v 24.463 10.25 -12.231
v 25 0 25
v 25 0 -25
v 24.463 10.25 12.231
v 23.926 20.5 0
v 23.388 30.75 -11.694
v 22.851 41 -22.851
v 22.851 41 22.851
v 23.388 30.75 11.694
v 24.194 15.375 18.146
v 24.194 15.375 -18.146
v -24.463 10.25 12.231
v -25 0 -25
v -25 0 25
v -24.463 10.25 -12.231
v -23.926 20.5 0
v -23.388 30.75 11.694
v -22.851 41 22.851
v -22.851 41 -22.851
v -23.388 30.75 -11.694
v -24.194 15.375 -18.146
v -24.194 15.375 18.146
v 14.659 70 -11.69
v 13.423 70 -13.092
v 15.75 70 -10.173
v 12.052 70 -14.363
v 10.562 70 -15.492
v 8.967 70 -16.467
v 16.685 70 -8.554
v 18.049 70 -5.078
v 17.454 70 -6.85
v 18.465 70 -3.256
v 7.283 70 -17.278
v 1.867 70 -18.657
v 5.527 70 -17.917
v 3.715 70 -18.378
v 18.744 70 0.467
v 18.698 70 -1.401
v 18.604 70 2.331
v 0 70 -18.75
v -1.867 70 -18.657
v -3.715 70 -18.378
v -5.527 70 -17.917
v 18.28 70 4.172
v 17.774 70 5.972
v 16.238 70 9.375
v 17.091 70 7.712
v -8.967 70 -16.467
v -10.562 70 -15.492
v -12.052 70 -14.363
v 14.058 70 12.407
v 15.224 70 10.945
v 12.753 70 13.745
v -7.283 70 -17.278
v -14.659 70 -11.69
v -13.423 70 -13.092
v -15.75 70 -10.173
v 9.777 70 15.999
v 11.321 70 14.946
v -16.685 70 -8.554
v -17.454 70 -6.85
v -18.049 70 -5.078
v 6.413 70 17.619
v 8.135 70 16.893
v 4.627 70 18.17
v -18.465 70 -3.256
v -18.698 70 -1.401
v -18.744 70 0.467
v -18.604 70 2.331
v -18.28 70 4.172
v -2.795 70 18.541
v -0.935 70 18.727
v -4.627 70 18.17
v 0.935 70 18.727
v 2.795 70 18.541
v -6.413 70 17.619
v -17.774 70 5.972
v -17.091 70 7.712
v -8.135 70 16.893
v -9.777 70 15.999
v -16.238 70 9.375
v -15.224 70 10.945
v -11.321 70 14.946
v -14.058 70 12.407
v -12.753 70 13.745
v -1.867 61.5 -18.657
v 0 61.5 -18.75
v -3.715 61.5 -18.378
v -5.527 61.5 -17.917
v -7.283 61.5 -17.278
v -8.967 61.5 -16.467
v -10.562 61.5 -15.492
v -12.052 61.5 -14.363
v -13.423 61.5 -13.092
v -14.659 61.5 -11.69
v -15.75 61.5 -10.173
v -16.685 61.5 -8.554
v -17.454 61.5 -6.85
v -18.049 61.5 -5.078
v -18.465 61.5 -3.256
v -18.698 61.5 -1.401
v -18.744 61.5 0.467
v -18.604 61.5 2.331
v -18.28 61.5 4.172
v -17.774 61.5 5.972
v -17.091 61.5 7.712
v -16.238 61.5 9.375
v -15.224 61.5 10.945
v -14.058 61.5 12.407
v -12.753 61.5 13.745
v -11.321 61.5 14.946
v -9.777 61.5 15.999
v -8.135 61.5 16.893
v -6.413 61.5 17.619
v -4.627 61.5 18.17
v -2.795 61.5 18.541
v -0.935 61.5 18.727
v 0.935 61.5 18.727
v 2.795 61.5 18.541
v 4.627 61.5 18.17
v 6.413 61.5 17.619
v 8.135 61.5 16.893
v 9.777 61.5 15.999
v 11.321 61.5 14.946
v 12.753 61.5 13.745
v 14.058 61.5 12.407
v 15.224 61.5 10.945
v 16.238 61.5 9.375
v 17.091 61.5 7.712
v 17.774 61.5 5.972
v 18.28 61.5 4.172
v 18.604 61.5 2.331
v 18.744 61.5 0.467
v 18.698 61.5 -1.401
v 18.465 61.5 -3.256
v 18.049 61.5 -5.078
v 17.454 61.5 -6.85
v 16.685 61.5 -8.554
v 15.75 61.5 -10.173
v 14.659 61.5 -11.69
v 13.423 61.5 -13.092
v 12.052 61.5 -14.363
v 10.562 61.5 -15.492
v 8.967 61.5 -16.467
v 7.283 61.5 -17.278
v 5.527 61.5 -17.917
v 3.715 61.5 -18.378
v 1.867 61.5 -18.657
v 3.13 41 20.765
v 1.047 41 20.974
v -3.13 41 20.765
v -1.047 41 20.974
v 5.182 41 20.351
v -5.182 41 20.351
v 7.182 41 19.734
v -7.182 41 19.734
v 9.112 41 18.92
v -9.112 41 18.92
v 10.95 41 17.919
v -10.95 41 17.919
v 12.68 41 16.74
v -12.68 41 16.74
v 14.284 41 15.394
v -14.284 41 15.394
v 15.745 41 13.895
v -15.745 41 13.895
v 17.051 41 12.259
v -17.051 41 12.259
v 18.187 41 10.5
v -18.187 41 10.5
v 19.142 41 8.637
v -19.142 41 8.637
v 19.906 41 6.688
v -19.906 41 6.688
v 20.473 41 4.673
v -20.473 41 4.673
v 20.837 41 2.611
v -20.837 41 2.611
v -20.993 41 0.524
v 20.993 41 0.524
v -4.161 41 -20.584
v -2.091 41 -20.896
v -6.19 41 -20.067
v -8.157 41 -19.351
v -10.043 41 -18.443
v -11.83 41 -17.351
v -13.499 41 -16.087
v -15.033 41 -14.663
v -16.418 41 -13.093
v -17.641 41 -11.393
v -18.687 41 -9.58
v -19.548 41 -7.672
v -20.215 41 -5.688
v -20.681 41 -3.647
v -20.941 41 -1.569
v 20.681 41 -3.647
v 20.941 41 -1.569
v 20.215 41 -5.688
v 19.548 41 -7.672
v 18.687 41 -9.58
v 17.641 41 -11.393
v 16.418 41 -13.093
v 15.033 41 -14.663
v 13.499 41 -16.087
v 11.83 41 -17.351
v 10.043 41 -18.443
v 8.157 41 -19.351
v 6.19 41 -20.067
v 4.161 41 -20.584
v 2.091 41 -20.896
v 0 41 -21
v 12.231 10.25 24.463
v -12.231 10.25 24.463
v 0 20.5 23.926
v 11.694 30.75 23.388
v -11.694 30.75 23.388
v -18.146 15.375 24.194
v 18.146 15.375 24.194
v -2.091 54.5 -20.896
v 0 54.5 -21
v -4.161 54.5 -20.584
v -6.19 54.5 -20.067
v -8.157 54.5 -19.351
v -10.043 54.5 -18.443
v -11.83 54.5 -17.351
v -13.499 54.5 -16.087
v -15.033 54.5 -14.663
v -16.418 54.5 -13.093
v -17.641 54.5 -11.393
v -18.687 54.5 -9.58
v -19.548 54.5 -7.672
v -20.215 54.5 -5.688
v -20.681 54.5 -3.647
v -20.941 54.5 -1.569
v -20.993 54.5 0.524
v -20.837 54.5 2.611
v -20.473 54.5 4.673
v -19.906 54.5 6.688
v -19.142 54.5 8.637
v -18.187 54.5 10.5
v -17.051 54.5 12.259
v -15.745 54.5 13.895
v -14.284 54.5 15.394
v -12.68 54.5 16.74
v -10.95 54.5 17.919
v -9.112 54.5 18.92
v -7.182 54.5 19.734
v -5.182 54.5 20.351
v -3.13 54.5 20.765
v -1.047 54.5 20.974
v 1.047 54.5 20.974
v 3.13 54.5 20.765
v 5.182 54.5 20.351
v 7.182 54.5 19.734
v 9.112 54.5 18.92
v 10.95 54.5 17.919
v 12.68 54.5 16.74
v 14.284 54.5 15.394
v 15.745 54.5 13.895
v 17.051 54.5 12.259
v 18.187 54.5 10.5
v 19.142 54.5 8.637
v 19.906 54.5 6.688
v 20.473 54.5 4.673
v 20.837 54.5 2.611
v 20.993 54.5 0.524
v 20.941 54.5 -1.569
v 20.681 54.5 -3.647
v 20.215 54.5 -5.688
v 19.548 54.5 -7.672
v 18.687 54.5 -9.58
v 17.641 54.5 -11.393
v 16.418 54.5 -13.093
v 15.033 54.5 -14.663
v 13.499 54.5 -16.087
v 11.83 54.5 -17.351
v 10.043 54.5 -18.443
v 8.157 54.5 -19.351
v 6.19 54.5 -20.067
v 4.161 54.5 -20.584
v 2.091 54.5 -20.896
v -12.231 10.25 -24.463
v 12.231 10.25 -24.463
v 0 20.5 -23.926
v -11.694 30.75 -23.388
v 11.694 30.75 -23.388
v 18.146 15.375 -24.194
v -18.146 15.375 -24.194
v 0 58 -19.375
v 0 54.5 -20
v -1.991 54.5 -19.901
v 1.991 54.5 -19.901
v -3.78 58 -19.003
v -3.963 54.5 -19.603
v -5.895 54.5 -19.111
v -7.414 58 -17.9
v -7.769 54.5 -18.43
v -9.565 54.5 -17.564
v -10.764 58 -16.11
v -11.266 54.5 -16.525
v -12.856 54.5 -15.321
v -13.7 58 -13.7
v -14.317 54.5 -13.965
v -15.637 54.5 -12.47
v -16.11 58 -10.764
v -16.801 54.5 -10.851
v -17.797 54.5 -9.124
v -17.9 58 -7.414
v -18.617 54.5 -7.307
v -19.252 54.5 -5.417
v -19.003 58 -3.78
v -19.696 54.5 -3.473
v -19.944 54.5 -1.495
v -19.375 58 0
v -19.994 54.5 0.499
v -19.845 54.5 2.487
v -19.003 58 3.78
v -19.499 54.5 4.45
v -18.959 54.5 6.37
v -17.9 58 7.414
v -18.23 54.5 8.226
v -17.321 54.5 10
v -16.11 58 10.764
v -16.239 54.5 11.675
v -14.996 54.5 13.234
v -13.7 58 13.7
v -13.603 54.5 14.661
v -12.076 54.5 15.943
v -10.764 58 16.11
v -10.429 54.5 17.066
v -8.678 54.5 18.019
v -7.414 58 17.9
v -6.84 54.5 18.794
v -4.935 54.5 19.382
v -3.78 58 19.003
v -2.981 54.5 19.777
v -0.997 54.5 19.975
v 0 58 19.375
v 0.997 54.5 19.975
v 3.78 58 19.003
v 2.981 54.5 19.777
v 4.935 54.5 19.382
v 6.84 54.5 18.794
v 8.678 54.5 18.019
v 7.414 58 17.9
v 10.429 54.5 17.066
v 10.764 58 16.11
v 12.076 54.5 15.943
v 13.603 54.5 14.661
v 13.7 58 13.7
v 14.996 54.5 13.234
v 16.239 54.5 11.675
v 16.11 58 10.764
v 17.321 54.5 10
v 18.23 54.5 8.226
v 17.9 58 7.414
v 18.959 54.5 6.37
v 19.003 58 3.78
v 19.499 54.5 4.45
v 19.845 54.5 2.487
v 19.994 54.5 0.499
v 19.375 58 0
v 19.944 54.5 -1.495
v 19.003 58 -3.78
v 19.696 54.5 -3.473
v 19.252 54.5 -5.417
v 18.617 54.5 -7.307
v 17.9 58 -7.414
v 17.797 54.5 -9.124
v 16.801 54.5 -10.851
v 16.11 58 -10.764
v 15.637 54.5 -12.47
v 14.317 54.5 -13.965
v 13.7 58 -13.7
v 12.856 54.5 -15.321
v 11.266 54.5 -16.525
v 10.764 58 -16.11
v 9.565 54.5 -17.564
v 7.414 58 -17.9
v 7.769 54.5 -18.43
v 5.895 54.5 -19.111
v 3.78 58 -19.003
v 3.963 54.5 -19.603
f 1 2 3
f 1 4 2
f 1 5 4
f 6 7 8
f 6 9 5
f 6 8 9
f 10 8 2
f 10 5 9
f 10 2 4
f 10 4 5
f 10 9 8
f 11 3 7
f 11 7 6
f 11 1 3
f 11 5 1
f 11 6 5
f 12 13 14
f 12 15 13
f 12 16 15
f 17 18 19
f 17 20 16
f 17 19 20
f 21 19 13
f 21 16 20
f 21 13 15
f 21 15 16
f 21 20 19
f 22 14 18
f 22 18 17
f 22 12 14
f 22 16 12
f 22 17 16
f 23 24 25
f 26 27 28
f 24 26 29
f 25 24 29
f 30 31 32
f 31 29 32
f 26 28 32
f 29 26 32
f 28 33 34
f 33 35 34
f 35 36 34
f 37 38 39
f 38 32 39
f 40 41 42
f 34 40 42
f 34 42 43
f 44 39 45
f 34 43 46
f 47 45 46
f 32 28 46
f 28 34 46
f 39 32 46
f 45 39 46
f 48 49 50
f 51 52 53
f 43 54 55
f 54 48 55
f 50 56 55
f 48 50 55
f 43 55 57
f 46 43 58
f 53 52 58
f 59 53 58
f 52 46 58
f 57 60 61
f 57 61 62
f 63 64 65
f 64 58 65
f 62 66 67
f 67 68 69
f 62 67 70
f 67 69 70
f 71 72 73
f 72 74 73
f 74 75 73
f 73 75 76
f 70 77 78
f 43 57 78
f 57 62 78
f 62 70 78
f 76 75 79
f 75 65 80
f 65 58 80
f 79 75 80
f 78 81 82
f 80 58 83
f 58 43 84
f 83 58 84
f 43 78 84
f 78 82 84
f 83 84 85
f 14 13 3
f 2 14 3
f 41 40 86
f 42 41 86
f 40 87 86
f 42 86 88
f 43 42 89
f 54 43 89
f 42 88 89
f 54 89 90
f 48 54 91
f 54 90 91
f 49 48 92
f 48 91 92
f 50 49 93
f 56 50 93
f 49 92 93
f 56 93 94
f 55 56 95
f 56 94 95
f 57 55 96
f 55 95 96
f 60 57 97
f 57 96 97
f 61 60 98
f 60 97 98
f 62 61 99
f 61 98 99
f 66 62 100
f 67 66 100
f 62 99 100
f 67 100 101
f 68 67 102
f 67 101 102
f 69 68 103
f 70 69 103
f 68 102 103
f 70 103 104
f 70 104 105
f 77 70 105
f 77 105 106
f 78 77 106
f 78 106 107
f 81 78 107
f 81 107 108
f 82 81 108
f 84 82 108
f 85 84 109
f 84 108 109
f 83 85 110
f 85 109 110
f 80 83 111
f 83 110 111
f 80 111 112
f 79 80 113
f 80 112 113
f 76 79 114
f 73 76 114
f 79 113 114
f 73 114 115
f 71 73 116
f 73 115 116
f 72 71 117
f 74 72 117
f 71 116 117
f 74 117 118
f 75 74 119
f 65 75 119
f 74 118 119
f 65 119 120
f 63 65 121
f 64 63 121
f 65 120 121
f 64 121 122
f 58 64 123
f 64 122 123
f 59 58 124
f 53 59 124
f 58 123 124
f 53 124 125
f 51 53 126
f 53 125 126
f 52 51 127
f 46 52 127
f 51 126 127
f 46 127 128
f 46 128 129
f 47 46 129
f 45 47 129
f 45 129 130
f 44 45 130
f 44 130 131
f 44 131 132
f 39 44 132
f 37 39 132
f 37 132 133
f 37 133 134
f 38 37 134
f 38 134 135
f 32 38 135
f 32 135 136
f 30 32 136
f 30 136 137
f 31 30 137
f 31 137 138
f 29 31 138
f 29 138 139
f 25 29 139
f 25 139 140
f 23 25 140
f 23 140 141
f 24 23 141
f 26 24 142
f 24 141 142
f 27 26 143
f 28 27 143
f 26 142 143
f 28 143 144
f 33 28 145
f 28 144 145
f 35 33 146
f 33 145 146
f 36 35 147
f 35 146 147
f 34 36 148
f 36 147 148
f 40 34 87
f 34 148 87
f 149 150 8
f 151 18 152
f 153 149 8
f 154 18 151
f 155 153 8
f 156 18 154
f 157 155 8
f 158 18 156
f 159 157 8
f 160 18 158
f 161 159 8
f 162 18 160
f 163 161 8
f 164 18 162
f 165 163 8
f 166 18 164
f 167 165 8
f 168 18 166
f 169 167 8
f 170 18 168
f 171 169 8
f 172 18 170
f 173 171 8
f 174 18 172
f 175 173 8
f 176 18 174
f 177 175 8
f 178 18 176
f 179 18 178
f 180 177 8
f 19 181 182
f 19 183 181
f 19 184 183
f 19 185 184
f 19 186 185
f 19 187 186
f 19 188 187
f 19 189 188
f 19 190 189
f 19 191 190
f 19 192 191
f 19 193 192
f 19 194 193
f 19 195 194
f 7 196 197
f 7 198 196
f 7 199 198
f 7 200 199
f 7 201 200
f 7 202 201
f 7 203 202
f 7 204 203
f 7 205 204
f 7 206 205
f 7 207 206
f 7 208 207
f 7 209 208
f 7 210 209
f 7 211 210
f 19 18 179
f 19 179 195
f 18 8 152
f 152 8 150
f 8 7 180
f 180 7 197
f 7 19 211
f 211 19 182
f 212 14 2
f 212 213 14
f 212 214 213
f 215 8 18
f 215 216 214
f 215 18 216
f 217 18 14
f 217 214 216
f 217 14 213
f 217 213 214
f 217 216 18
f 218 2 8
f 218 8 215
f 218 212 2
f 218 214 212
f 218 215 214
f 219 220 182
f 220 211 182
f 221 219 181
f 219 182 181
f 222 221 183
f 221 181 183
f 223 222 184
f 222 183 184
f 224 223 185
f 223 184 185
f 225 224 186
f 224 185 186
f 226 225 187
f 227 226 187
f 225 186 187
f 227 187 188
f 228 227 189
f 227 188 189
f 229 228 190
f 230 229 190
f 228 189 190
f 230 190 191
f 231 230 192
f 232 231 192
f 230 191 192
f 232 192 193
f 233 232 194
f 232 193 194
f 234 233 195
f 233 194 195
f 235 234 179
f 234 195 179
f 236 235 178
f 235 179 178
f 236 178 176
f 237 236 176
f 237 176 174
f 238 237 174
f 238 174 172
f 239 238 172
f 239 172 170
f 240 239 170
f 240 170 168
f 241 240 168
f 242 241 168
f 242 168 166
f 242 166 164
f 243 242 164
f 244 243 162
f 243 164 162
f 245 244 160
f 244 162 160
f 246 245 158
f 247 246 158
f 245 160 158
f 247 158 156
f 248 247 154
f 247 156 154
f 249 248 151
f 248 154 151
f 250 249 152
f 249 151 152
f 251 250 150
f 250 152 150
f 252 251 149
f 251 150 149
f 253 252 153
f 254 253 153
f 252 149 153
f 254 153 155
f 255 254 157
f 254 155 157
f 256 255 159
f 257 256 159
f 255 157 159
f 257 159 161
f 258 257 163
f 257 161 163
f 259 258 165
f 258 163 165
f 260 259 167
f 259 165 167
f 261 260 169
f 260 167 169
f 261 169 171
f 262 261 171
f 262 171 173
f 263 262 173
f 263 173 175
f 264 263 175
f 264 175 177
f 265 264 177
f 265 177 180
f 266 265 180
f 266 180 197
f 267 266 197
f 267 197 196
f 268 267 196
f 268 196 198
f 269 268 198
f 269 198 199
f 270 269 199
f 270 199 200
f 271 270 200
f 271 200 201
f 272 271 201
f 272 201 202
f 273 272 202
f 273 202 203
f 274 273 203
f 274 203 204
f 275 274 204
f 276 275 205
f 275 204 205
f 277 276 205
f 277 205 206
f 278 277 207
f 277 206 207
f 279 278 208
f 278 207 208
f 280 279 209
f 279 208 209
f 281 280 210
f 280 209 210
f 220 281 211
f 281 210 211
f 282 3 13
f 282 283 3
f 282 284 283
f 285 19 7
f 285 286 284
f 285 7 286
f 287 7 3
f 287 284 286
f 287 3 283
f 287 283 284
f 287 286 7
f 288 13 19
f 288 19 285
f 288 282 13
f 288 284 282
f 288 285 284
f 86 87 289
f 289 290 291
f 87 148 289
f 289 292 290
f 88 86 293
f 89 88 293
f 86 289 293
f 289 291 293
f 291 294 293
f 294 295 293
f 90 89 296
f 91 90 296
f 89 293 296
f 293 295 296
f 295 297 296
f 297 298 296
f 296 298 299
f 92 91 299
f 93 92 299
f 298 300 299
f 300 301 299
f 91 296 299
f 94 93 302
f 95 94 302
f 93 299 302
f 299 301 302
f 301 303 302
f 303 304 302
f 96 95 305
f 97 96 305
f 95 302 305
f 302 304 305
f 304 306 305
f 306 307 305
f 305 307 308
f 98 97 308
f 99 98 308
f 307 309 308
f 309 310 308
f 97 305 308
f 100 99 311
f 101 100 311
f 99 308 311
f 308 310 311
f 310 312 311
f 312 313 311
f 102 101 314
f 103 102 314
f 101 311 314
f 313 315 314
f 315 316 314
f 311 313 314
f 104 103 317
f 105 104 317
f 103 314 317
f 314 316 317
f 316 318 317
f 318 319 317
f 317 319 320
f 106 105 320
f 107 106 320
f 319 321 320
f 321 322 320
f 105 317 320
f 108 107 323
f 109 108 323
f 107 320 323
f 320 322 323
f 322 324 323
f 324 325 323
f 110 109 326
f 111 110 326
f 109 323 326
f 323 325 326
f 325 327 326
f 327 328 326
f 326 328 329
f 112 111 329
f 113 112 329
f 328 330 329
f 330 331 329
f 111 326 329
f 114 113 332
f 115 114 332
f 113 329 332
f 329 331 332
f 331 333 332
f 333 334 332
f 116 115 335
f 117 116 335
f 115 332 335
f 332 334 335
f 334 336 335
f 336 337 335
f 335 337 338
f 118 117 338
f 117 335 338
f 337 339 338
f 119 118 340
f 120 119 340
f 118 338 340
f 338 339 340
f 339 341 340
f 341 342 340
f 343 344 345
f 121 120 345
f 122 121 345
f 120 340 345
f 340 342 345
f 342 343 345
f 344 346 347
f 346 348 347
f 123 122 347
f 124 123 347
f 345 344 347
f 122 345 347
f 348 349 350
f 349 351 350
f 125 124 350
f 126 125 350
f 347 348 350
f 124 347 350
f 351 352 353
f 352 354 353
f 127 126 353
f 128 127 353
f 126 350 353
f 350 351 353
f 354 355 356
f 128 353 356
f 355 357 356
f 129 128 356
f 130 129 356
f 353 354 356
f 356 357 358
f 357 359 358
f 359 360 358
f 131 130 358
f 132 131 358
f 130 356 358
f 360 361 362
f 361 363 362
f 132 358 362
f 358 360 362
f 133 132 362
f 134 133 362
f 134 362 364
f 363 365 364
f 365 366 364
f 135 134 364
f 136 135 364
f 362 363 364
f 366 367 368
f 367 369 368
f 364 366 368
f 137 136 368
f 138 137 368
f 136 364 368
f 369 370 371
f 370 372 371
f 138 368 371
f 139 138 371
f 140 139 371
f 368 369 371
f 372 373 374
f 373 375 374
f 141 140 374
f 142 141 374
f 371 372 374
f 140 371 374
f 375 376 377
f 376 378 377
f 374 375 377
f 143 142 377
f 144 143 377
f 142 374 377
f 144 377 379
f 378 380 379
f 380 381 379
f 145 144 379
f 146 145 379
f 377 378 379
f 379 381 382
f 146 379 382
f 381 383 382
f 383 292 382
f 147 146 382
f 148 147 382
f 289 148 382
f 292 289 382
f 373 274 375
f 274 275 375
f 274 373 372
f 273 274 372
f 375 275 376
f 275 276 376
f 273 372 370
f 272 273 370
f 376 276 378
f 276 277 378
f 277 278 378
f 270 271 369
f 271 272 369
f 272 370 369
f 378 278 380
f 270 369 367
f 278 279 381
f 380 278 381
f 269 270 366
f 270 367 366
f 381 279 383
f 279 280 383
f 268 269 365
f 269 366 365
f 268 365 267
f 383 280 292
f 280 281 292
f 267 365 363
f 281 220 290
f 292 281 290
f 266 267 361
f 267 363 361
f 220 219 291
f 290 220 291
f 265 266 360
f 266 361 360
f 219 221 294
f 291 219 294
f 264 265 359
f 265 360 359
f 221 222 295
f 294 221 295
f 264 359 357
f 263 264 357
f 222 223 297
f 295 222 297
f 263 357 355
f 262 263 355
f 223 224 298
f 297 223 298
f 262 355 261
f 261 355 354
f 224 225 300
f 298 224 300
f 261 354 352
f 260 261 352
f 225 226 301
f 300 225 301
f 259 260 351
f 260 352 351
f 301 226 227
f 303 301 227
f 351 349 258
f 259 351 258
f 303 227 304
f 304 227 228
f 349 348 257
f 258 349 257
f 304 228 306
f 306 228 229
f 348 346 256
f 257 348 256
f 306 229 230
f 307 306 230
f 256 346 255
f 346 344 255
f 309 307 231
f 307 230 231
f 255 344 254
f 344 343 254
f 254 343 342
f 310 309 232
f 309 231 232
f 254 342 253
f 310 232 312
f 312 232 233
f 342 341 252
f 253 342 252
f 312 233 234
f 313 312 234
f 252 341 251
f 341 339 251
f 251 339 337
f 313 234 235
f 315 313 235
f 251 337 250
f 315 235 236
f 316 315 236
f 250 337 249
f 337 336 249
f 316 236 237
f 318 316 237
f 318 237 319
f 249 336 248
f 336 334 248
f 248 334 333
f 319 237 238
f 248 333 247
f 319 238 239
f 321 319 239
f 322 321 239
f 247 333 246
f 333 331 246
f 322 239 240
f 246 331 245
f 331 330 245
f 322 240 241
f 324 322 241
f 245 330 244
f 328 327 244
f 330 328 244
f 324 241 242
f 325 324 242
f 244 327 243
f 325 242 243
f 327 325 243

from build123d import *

# Parameters (mm, degrees)
ESBO_O1_W                = 50
ESBO_O1_H                = 50
RESSALTO_EXTRUS_O1_DEPTH = 41
RESSALTO_EXTRUS_O1_TAPER = 3


with BuildPart() as part:
    # Esboço1 → Ressalto-extrusão1 (new body)
    with BuildSketch(Plane(origin=(0, 0, 0), x_dir=(1, 0, 0), z_dir=(0, 1, 0))):
        Rectangle(ESBO_O1_W, ESBO_O1_H)
    extrude(amount=RESSALTO_EXTRUS_O1_DEPTH, taper=RESSALTO_EXTRUS_O1_TAPER)

    # Esboço2 → Revolução1 (revolve)
    with BuildSketch(Plane(origin=(0, 0, 0), x_dir=(0, 0, -1), z_dir=(1, 0, 0))):
        Polygon((0, 41), (0, 70), (18.75, 70), (18.75, 61.5), (20, 54.5), (21, 54.5), (21, 41), align=None)
    revolve(axis=Axis((0, 41, 0), (0, 1, 0)))


solid = part.part
